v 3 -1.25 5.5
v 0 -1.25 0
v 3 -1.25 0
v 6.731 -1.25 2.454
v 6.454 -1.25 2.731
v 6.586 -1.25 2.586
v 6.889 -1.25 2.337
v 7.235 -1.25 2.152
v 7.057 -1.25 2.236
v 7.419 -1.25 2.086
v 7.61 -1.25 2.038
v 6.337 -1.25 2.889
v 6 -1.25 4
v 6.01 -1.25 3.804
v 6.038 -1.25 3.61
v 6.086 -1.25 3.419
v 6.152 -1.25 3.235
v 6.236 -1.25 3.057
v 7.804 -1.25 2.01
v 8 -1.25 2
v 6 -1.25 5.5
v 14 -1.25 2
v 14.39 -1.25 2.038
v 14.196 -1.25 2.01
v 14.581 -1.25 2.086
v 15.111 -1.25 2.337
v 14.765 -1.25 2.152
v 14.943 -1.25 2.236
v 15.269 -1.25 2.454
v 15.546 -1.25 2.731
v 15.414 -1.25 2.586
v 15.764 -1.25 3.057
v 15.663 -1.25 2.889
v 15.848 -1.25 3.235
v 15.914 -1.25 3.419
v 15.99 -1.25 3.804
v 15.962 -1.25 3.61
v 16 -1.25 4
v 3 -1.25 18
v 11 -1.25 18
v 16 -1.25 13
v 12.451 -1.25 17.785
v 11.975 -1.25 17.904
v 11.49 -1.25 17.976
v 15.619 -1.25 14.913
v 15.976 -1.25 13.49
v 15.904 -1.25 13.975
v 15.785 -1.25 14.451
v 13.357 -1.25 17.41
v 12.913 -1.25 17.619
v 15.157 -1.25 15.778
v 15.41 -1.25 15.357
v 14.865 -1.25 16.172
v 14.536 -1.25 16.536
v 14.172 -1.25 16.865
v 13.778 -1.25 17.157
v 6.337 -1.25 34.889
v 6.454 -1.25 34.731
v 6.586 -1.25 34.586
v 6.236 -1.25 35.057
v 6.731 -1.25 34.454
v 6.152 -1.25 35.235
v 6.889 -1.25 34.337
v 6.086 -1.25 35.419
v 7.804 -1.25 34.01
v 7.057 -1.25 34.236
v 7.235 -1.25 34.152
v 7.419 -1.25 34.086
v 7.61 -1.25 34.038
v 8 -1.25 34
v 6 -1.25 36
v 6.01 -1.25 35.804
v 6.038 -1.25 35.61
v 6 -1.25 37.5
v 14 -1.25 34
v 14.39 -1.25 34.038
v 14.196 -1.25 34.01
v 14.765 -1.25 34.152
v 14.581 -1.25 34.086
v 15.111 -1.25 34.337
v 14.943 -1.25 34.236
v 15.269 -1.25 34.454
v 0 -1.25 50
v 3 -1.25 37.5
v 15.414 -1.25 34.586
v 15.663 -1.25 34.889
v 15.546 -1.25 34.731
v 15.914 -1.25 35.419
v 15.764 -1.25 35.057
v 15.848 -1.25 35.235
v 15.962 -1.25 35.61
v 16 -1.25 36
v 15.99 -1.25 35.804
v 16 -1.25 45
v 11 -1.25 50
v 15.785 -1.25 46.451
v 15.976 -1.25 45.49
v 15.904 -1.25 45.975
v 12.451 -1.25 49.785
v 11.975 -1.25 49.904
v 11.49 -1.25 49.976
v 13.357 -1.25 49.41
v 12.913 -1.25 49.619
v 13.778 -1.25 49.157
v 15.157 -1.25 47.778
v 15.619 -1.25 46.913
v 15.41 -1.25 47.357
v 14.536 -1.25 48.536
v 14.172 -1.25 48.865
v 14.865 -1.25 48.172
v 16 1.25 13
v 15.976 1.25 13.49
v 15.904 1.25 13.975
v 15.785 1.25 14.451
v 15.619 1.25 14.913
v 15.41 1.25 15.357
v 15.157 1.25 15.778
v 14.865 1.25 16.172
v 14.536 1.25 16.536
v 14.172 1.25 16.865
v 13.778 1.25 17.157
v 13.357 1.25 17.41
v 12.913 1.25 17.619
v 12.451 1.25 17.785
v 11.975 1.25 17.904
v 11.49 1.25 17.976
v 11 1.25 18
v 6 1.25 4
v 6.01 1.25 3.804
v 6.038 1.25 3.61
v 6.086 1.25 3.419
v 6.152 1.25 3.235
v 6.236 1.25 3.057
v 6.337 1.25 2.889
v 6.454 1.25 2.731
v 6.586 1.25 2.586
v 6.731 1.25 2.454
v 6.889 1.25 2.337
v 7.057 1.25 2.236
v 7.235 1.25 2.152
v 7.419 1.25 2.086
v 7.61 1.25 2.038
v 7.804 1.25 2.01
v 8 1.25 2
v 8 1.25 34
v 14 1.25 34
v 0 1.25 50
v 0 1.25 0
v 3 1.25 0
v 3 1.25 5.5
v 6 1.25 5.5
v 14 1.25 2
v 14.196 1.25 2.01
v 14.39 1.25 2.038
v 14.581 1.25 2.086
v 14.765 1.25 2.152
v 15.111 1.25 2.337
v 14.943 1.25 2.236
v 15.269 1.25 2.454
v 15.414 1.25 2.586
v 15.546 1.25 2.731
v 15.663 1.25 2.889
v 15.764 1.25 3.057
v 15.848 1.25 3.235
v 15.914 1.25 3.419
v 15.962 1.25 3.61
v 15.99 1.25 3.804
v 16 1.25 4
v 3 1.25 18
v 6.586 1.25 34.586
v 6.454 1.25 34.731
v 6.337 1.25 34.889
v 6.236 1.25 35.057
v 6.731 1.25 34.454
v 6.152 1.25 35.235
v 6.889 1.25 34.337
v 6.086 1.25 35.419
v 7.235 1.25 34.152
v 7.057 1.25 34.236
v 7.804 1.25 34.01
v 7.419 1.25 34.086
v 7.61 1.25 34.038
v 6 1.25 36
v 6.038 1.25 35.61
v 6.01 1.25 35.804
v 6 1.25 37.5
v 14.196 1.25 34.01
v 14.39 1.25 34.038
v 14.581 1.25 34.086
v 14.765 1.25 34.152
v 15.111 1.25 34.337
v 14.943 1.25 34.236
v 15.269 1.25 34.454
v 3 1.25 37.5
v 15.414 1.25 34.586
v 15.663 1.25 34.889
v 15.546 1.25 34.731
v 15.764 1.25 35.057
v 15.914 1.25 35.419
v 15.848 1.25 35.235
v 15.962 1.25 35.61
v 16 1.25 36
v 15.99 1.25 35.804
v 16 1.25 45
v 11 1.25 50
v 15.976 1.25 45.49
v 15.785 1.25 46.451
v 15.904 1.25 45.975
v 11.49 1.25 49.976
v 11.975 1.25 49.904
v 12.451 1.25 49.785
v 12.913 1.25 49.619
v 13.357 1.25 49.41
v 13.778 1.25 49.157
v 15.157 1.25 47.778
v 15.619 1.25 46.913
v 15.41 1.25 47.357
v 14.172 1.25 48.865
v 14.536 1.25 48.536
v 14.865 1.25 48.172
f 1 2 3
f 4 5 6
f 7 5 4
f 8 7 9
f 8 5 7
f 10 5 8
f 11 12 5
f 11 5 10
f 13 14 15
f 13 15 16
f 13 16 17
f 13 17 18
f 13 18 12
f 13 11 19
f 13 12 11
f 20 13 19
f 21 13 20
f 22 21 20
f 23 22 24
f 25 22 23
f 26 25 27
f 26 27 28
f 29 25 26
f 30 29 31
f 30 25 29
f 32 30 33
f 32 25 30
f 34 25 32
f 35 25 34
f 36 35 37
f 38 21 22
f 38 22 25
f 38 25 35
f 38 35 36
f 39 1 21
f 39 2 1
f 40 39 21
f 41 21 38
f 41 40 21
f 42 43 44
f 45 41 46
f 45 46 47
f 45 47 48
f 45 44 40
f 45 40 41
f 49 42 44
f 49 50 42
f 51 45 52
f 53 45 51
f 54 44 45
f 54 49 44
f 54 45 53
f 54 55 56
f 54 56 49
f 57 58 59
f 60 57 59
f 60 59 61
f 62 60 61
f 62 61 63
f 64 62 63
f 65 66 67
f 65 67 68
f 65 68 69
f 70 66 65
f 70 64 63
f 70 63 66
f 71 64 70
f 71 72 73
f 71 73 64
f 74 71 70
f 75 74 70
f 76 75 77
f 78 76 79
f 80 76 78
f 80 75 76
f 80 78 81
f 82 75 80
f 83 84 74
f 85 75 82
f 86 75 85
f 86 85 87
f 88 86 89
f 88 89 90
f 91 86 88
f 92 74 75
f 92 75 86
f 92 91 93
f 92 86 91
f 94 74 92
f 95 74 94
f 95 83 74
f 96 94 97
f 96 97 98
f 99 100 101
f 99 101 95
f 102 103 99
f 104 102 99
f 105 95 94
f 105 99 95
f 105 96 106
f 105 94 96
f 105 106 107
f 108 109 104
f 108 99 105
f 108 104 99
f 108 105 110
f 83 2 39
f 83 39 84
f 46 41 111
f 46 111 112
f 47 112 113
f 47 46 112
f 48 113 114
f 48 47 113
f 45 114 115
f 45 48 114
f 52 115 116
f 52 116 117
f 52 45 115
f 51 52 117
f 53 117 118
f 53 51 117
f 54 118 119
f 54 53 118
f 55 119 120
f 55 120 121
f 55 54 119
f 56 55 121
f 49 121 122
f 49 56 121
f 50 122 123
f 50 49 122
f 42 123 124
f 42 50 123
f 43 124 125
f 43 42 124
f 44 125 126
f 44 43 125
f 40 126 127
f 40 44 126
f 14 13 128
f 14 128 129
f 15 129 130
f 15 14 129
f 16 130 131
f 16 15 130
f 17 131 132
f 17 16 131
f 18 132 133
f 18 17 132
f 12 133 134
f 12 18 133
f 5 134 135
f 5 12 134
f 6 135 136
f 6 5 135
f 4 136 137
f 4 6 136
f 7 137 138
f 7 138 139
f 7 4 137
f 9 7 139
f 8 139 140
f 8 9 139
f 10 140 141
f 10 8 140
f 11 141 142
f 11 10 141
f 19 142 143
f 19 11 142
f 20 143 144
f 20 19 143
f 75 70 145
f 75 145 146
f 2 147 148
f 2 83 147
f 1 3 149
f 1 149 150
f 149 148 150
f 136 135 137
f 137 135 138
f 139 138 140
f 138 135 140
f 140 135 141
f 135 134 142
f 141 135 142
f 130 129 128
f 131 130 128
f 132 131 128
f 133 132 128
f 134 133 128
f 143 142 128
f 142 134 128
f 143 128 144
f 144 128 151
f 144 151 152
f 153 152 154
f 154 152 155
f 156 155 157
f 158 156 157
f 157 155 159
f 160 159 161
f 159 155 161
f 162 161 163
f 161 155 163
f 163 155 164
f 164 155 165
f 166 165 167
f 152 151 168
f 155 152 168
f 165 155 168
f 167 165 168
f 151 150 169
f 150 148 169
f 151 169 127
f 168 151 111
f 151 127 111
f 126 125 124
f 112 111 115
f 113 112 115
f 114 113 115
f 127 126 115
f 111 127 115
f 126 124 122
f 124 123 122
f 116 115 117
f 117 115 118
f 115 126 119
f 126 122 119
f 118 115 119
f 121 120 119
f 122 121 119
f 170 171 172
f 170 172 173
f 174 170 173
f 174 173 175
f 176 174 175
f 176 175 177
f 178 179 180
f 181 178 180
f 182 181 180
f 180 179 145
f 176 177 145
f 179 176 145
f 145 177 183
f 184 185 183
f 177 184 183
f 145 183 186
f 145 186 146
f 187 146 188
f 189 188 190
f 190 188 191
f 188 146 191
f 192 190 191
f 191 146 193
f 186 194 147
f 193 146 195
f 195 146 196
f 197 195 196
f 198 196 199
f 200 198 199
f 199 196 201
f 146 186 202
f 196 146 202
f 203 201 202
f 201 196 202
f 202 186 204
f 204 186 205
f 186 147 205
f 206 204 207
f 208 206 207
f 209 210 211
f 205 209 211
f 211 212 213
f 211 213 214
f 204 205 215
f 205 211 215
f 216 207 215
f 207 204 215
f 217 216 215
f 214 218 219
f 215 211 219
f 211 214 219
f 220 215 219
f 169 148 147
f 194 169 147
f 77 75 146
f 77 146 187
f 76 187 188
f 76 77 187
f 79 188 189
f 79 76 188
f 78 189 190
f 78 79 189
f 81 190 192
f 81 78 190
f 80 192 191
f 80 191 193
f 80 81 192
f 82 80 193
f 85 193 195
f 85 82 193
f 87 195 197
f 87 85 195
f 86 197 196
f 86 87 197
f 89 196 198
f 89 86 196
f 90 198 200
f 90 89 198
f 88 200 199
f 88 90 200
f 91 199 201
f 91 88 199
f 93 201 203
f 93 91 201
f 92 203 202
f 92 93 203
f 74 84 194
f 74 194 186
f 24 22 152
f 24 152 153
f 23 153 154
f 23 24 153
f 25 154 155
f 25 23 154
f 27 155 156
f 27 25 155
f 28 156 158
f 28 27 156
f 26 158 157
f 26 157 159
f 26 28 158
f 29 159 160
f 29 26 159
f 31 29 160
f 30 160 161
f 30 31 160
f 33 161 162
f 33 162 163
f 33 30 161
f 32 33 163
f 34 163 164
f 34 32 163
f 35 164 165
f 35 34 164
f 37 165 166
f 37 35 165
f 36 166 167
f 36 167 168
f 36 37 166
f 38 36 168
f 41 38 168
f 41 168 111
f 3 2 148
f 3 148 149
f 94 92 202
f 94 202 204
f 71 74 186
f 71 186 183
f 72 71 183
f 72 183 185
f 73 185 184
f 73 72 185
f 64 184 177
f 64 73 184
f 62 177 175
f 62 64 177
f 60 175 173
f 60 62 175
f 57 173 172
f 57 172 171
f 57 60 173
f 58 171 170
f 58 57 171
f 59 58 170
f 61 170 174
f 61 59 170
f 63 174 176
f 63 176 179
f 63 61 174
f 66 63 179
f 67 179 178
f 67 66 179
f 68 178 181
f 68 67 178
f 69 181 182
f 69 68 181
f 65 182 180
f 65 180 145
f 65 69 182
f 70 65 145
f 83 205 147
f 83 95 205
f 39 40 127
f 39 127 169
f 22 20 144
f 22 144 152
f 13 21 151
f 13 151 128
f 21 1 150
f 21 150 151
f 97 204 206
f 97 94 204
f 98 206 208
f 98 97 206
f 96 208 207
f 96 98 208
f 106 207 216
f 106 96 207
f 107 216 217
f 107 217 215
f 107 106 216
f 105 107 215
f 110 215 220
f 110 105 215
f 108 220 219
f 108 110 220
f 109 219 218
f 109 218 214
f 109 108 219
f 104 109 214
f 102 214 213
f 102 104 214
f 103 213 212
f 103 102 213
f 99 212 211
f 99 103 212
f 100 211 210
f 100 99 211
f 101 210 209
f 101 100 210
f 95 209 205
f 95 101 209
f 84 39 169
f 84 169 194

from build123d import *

# Parameters (mm, degrees)
F1_W     = 3
F1_H     = 12.5
F2_DEPTH = 1.25


with BuildPart() as f2:
    # F1 (on Front) → F2 (new body, symmetric)
    with BuildSketch(Plane.XZ):
        Polygon((3, 50), (0, 50), (0, 0), (3, 0), (3, 5.5), (3, 18), (3, 37.5), align=None)
        with Locations((4.5, 43.75)):
            Rectangle(F1_W, F1_H)
        with BuildLine():
            Line((11, 50), (6, 50))
            Line((6, 50), (6, 37.5))
            Line((6, 37.5), (6, 36))
            ThreePointArc((6, 36), (6.5857864376, 34.5857864376), (8, 34))
            Line((8, 34), (14, 34))
            ThreePointArc((14, 34), (15.4142135624, 34.5857864376), (16, 36))
            Line((16, 36), (16, 45))
            ThreePointArc((16, 45), (14.5355339059, 48.5355339059), (11, 50))
        make_face()
        with Locations((4.5, 11.75)):
            Rectangle(F1_W, F1_H)
        with BuildLine():
            Line((11, 18), (6, 18))
            Line((6, 18), (6, 5.5))
            Line((6, 5.5), (6, 4))
            ThreePointArc((6, 4), (6.5857864376, 2.5857864376), (8, 2))
            Line((8, 2), (14, 2))
            ThreePointArc((14, 2), (15.4142135624, 2.5857864376), (16, 4))
            Line((16, 4), (16, 13))
            ThreePointArc((16, 13), (14.5355339059, 16.5355339059), (11, 18))
        make_face()
    extrude(amount=F2_DEPTH, both=True)


solid = f2.part
